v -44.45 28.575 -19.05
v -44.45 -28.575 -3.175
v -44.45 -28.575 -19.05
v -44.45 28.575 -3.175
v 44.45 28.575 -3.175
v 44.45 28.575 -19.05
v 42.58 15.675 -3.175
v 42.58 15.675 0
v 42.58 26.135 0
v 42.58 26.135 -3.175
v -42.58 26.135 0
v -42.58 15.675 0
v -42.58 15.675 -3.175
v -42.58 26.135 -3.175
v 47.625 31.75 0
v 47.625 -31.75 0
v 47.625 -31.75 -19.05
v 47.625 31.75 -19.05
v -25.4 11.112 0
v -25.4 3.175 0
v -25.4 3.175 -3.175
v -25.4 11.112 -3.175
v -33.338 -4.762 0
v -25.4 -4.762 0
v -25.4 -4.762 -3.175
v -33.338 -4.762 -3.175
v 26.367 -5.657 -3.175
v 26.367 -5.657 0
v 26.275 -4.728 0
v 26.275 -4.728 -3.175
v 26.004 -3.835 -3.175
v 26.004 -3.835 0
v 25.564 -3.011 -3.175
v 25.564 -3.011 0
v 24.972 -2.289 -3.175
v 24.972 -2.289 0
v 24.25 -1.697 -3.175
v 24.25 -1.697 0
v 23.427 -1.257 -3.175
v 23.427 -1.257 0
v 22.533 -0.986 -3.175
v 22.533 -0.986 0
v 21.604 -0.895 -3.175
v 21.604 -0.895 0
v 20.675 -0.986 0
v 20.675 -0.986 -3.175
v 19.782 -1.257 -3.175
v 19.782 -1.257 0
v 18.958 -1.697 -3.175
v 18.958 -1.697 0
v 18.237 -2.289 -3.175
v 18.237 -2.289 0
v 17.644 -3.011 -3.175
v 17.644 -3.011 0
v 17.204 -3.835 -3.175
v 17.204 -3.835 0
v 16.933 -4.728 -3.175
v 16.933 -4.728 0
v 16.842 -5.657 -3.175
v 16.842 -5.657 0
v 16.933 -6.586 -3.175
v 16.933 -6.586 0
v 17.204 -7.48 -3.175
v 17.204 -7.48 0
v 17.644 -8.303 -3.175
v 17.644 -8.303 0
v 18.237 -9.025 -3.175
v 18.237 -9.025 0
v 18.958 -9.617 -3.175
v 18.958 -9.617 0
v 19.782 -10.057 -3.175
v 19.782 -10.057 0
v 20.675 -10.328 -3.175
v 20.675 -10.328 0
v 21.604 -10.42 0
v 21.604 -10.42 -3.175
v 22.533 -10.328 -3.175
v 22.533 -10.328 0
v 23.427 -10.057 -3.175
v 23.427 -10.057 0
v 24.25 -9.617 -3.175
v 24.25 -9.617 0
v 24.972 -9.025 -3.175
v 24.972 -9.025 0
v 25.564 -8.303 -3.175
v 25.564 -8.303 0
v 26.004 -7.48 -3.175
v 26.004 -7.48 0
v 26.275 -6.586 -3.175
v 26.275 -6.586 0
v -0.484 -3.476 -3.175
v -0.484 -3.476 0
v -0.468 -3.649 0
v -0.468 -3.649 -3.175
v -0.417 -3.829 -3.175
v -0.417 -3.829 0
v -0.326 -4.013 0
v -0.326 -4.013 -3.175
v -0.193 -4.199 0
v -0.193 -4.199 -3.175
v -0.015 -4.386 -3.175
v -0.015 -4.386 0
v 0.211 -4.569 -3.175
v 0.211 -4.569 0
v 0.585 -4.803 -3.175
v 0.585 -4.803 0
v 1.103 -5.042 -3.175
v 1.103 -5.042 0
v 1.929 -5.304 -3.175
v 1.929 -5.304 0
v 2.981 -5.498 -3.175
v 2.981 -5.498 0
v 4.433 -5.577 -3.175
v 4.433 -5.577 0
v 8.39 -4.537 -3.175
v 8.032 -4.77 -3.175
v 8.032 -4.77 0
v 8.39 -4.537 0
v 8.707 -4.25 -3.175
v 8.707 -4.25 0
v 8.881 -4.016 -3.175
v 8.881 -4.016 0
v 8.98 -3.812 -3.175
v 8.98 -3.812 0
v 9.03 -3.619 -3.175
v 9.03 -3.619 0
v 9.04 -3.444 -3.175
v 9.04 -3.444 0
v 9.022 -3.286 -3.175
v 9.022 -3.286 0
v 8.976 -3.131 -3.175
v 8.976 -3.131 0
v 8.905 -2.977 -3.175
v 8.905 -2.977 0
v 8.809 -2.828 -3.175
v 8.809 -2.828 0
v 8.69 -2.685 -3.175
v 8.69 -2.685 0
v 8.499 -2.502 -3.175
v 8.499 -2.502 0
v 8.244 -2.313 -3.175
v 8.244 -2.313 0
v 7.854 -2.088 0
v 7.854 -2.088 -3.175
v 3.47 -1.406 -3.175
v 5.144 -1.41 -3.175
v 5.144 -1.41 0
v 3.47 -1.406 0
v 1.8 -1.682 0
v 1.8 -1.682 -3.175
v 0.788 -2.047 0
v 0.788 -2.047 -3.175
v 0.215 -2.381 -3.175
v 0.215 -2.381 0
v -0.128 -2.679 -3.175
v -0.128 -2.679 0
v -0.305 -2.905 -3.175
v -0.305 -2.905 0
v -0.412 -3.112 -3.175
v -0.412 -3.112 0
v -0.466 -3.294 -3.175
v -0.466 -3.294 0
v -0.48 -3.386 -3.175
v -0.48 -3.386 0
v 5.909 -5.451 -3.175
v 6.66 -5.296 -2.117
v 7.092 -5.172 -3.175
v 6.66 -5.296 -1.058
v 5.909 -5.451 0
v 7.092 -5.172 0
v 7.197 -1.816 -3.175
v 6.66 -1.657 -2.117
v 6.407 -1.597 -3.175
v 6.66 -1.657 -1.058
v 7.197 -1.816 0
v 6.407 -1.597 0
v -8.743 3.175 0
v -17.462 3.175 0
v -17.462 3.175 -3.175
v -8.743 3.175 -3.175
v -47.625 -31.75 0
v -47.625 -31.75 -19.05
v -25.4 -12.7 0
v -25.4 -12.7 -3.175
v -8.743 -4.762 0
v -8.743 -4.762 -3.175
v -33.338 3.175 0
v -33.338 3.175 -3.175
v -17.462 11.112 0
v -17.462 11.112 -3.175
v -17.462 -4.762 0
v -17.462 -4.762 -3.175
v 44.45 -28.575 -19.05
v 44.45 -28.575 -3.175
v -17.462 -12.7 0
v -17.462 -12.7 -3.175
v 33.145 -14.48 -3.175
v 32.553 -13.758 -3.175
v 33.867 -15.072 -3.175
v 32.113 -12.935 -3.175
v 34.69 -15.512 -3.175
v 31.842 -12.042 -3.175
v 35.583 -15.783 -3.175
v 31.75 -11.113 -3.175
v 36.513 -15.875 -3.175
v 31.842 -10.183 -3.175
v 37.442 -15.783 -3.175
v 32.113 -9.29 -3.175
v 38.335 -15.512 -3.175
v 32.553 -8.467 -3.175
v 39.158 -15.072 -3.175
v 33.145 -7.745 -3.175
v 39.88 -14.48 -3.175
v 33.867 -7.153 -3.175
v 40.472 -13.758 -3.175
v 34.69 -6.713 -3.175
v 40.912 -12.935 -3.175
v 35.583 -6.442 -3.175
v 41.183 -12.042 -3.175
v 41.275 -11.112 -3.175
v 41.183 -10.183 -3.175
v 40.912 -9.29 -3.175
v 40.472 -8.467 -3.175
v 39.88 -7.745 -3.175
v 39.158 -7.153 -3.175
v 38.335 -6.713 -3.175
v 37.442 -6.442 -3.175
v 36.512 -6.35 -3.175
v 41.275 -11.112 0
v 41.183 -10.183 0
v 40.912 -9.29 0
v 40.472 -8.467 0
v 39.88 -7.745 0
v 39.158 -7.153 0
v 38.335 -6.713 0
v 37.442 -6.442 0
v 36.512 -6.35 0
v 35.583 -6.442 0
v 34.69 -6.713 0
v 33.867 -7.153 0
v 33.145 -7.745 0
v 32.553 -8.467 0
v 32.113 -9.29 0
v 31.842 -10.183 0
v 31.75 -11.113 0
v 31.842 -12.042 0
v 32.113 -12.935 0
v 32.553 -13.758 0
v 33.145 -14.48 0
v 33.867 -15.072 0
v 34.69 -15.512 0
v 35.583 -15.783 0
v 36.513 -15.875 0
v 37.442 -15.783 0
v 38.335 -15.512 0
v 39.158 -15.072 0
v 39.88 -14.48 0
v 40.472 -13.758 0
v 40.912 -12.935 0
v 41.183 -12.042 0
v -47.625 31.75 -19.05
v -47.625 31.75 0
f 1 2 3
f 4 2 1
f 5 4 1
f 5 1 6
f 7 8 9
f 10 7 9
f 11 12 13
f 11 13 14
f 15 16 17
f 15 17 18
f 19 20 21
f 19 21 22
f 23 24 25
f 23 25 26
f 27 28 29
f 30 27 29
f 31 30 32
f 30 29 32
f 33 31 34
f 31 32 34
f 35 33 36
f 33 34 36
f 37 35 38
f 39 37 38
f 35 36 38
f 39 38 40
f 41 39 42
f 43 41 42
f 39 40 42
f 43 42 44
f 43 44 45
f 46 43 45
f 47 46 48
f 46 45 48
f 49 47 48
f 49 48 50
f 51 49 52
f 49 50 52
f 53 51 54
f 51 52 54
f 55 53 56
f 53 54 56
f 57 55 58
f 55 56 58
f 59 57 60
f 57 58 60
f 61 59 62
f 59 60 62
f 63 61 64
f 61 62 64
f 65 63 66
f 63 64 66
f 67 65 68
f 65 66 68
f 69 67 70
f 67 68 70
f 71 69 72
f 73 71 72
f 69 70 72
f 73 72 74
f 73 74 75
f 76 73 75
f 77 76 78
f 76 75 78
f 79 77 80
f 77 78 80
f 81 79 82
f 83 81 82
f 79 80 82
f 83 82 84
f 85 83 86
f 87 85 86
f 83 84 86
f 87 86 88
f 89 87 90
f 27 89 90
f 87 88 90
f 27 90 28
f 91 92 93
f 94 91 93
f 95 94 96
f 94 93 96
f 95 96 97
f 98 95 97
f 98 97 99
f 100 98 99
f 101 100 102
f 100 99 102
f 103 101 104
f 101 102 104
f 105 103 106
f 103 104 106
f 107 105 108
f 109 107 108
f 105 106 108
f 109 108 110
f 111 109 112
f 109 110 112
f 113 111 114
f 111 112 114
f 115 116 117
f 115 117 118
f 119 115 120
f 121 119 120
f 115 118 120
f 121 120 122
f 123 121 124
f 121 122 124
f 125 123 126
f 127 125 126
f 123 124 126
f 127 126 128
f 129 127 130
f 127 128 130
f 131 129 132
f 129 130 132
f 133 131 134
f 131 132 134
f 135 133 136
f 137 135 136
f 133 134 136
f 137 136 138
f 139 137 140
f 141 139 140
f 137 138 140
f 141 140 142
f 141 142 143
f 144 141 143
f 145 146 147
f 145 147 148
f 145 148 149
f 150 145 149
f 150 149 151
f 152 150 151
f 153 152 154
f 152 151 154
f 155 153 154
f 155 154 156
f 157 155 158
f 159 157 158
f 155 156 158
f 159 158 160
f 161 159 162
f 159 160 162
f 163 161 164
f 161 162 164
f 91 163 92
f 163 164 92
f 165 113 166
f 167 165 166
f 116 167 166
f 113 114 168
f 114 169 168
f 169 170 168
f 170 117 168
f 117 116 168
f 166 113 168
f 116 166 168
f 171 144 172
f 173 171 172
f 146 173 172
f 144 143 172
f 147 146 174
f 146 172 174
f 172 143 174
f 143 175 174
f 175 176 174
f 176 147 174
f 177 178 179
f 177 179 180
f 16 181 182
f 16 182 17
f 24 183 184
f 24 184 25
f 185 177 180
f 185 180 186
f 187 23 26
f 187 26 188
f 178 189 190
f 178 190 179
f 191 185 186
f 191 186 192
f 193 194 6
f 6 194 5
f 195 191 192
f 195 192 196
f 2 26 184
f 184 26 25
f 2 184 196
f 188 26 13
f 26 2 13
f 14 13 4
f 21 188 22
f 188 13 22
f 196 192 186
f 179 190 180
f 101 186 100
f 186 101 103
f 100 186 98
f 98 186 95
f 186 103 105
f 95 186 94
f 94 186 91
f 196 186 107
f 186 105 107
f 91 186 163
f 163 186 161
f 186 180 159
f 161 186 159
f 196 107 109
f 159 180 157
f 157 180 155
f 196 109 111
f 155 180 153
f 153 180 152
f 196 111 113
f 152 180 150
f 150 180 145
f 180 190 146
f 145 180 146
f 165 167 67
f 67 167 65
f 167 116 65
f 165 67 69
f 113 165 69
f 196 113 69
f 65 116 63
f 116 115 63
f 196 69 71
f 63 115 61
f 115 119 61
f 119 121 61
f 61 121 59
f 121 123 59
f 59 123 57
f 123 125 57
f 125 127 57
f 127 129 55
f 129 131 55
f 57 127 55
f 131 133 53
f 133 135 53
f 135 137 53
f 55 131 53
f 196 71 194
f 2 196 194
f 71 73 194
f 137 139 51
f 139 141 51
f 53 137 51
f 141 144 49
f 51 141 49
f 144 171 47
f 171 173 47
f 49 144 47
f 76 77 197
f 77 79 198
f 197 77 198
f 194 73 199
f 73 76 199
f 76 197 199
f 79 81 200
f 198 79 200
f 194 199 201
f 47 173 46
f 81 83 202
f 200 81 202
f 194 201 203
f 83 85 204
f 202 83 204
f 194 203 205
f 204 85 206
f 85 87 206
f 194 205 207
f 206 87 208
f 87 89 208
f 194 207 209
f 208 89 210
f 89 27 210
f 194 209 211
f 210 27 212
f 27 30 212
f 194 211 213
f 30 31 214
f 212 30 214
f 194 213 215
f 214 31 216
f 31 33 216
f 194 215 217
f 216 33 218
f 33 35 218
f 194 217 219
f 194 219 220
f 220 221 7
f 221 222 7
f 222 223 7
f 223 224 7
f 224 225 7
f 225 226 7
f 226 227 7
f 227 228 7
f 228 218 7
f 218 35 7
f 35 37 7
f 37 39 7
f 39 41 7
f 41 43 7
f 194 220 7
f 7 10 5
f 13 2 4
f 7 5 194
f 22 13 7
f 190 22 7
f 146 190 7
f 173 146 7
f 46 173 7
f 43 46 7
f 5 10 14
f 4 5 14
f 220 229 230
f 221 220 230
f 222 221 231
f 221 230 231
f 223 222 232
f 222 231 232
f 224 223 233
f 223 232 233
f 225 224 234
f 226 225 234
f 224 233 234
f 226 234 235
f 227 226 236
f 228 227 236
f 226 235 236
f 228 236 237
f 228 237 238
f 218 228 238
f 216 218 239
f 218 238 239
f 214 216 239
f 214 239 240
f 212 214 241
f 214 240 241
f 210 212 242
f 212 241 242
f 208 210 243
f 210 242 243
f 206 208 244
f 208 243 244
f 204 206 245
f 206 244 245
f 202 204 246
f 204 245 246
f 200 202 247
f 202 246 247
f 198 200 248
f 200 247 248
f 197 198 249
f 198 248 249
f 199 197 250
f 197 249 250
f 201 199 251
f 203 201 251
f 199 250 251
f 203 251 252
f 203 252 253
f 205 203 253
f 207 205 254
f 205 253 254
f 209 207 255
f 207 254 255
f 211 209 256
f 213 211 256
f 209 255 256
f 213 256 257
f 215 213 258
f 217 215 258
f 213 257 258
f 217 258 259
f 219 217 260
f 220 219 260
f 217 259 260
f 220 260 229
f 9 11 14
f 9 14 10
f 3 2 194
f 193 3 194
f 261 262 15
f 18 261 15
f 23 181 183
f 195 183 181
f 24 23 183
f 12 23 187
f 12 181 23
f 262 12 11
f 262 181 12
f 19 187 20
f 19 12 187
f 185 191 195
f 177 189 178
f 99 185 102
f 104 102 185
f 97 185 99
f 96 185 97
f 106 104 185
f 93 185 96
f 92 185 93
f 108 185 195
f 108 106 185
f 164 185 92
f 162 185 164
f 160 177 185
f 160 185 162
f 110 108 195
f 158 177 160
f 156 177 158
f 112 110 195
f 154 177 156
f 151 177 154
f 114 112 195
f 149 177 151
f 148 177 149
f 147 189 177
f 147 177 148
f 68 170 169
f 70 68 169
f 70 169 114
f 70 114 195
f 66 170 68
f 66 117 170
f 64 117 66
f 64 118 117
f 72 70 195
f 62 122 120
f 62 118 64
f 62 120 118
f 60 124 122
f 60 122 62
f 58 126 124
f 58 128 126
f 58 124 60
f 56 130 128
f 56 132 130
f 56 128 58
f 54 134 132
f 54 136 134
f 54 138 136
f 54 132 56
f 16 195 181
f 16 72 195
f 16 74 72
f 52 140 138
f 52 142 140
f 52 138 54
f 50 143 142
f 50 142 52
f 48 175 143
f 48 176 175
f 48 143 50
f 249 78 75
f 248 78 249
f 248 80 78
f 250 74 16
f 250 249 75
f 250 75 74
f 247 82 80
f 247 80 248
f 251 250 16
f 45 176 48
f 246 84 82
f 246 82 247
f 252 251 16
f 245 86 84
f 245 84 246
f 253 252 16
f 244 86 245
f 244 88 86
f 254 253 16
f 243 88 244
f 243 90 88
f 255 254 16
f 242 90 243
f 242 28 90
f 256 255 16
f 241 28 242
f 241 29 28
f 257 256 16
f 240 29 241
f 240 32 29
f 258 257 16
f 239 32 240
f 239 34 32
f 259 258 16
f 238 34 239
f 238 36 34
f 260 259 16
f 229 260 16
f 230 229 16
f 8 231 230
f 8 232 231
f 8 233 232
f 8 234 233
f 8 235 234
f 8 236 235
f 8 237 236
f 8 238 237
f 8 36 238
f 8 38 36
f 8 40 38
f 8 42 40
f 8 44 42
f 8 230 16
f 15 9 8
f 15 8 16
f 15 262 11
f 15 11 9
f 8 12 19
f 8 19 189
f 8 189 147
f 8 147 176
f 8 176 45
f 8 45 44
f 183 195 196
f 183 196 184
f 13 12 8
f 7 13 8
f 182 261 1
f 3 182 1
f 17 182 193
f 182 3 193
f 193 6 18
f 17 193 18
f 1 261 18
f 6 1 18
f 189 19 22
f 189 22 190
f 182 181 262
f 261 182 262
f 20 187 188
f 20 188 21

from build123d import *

# Parameters (mm, degrees)
F0_W     = 88.9
F0_H     = 57.15
F0_R     = 4.7625
F0_W_2   = 85.160196
F0_H_2   = 10.460668
F1_DEPTH = 3.175
F0_W_3   = 95.25
F0_H_3   = 63.5
F2_DEPTH = 19.05


with BuildPart() as f1:
    # F0 (on Top) → F1 (new body)
    with BuildSketch(Plane.XY):
        Rectangle(F0_W, F0_H)
        Polygon((-25.4, 3.175), (-25.4, 11.1125), (-17.4625, 11.1125), (-17.4625, 3.175), (-8.742713, 3.175), (-8.742713, -4.7625), (-17.4625, -4.7625), (-17.4625, -12.7), (-25.4, -12.7), (-25.4, -4.7625), (-33.3375, -4.7625), (-33.3375, 3.175), align=None, mode=Mode.SUBTRACT)
        with BuildLine():
            add(Edge.make_bspline(
                [(-0.483984, -3.476414), (-0.483984, -7.115989), (6.659766, -5.296201), (13.803516, -3.476414), (6.659766, -1.656627), (-0.483984, 0.163161), (-0.483984, -3.476414)],
                knots=[0, 0, 0, 2.094395, 2.094395, 4.18879, 4.18879, 6.283185, 6.283185, 6.283185], degree=2, weights=[1, 0.5, 1, 0.5, 1, 0.5, 1]))
        make_face(mode=Mode.SUBTRACT)
        with Locations((21.604328, -5.65704)):
            Circle(F0_R, mode=Mode.SUBTRACT)
        with Locations((36.5125, -11.1125)):
            Circle(F0_R, mode=Mode.SUBTRACT)
        with Locations((0, 20.904867)):
            Rectangle(F0_W_2, F0_H_2, mode=Mode.SUBTRACT)
    extrude(amount=-F1_DEPTH)

    # F0 (on Top) → F2 (join)
    with BuildSketch(Plane.XY):
        Rectangle(F0_W_3, F0_H_3)
        Rectangle(F0_W, F0_H, mode=Mode.SUBTRACT)
    extrude(amount=-F2_DEPTH)


solid = f1.part
